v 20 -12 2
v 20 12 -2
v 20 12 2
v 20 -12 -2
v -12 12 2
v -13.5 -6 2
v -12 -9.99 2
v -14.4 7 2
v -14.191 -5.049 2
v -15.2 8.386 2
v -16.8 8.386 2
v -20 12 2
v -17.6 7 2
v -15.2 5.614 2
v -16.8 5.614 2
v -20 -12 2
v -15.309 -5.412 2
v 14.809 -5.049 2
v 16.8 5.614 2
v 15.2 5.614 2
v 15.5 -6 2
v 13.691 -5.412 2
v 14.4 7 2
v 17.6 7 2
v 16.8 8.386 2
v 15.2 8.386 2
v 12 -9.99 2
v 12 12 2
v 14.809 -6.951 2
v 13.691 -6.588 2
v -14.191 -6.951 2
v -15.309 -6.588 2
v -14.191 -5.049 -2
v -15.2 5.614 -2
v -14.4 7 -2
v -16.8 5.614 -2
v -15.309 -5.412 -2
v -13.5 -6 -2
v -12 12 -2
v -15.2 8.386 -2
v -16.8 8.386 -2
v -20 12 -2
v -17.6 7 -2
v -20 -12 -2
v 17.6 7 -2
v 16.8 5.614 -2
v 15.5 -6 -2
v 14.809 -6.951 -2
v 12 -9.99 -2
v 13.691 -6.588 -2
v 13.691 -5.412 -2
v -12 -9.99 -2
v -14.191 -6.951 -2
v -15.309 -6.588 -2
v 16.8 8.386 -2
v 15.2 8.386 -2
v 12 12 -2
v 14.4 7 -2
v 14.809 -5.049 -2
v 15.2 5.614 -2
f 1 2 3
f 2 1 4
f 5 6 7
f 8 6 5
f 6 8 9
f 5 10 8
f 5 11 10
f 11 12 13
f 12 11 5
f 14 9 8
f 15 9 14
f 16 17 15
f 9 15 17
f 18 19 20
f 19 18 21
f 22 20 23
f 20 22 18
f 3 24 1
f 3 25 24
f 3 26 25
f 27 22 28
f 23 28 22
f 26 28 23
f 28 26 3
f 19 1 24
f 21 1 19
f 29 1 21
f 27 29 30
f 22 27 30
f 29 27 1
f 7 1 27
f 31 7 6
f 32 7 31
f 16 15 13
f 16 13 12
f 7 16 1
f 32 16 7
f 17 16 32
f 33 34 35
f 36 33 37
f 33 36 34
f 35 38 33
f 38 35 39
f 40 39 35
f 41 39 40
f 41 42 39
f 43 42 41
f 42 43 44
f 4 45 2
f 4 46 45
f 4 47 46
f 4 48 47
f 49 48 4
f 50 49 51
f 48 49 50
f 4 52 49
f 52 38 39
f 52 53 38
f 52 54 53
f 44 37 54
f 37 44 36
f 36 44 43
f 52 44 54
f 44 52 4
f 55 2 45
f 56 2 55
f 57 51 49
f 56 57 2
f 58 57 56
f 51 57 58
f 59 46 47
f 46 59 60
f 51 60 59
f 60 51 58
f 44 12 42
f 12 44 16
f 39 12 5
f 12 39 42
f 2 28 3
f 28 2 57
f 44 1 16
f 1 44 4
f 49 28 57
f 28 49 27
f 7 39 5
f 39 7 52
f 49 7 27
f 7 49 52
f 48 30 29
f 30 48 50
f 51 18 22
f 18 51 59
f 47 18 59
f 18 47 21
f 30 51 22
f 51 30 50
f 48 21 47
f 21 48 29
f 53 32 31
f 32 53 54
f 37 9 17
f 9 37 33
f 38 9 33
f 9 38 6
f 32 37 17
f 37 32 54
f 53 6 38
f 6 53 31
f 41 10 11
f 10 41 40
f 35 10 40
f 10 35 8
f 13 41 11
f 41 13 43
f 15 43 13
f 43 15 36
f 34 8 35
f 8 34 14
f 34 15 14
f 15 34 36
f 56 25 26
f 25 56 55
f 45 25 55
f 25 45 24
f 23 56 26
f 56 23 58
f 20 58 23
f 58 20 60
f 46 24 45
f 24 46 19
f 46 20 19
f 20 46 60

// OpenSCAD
parede_lateral = 8;
parede_frontal = 2; 
largura_interna = 24;  // tamanho interno 
prof_interna = 22; 
altura = 4; 
desloc_m = 2.5; // posicão do furo do motor na profundidade 



difference(){
    difference(){
        cube([largura_interna+2*parede_lateral, prof_interna+parede_frontal,altura],true);   

        translate([0,parede_frontal/2+0.01])
        cube([largura_interna,prof_interna,altura+2],true);    
        
    }

    {
    translate([largura_interna/2+2.5,-12/2,-altura/2-1])
    cylinder(altura+2,1,true);
        
    translate([-(largura_interna/2+2.5),-12/2,-altura/2-1])
    cylinder(altura+2,1,true);
        
    translate([-(largura_interna/2+parede_lateral/2),prof_interna/2 - parede_lateral/2,-altura/2-1])
    cylinder(altura+2,r=1.6,true);
        
    translate([(largura_interna/2+parede_lateral/2),prof_interna/2 - parede_lateral/2,-altura/2-1])
    cylinder(altura+2,r=1.6,true);
    }
}
